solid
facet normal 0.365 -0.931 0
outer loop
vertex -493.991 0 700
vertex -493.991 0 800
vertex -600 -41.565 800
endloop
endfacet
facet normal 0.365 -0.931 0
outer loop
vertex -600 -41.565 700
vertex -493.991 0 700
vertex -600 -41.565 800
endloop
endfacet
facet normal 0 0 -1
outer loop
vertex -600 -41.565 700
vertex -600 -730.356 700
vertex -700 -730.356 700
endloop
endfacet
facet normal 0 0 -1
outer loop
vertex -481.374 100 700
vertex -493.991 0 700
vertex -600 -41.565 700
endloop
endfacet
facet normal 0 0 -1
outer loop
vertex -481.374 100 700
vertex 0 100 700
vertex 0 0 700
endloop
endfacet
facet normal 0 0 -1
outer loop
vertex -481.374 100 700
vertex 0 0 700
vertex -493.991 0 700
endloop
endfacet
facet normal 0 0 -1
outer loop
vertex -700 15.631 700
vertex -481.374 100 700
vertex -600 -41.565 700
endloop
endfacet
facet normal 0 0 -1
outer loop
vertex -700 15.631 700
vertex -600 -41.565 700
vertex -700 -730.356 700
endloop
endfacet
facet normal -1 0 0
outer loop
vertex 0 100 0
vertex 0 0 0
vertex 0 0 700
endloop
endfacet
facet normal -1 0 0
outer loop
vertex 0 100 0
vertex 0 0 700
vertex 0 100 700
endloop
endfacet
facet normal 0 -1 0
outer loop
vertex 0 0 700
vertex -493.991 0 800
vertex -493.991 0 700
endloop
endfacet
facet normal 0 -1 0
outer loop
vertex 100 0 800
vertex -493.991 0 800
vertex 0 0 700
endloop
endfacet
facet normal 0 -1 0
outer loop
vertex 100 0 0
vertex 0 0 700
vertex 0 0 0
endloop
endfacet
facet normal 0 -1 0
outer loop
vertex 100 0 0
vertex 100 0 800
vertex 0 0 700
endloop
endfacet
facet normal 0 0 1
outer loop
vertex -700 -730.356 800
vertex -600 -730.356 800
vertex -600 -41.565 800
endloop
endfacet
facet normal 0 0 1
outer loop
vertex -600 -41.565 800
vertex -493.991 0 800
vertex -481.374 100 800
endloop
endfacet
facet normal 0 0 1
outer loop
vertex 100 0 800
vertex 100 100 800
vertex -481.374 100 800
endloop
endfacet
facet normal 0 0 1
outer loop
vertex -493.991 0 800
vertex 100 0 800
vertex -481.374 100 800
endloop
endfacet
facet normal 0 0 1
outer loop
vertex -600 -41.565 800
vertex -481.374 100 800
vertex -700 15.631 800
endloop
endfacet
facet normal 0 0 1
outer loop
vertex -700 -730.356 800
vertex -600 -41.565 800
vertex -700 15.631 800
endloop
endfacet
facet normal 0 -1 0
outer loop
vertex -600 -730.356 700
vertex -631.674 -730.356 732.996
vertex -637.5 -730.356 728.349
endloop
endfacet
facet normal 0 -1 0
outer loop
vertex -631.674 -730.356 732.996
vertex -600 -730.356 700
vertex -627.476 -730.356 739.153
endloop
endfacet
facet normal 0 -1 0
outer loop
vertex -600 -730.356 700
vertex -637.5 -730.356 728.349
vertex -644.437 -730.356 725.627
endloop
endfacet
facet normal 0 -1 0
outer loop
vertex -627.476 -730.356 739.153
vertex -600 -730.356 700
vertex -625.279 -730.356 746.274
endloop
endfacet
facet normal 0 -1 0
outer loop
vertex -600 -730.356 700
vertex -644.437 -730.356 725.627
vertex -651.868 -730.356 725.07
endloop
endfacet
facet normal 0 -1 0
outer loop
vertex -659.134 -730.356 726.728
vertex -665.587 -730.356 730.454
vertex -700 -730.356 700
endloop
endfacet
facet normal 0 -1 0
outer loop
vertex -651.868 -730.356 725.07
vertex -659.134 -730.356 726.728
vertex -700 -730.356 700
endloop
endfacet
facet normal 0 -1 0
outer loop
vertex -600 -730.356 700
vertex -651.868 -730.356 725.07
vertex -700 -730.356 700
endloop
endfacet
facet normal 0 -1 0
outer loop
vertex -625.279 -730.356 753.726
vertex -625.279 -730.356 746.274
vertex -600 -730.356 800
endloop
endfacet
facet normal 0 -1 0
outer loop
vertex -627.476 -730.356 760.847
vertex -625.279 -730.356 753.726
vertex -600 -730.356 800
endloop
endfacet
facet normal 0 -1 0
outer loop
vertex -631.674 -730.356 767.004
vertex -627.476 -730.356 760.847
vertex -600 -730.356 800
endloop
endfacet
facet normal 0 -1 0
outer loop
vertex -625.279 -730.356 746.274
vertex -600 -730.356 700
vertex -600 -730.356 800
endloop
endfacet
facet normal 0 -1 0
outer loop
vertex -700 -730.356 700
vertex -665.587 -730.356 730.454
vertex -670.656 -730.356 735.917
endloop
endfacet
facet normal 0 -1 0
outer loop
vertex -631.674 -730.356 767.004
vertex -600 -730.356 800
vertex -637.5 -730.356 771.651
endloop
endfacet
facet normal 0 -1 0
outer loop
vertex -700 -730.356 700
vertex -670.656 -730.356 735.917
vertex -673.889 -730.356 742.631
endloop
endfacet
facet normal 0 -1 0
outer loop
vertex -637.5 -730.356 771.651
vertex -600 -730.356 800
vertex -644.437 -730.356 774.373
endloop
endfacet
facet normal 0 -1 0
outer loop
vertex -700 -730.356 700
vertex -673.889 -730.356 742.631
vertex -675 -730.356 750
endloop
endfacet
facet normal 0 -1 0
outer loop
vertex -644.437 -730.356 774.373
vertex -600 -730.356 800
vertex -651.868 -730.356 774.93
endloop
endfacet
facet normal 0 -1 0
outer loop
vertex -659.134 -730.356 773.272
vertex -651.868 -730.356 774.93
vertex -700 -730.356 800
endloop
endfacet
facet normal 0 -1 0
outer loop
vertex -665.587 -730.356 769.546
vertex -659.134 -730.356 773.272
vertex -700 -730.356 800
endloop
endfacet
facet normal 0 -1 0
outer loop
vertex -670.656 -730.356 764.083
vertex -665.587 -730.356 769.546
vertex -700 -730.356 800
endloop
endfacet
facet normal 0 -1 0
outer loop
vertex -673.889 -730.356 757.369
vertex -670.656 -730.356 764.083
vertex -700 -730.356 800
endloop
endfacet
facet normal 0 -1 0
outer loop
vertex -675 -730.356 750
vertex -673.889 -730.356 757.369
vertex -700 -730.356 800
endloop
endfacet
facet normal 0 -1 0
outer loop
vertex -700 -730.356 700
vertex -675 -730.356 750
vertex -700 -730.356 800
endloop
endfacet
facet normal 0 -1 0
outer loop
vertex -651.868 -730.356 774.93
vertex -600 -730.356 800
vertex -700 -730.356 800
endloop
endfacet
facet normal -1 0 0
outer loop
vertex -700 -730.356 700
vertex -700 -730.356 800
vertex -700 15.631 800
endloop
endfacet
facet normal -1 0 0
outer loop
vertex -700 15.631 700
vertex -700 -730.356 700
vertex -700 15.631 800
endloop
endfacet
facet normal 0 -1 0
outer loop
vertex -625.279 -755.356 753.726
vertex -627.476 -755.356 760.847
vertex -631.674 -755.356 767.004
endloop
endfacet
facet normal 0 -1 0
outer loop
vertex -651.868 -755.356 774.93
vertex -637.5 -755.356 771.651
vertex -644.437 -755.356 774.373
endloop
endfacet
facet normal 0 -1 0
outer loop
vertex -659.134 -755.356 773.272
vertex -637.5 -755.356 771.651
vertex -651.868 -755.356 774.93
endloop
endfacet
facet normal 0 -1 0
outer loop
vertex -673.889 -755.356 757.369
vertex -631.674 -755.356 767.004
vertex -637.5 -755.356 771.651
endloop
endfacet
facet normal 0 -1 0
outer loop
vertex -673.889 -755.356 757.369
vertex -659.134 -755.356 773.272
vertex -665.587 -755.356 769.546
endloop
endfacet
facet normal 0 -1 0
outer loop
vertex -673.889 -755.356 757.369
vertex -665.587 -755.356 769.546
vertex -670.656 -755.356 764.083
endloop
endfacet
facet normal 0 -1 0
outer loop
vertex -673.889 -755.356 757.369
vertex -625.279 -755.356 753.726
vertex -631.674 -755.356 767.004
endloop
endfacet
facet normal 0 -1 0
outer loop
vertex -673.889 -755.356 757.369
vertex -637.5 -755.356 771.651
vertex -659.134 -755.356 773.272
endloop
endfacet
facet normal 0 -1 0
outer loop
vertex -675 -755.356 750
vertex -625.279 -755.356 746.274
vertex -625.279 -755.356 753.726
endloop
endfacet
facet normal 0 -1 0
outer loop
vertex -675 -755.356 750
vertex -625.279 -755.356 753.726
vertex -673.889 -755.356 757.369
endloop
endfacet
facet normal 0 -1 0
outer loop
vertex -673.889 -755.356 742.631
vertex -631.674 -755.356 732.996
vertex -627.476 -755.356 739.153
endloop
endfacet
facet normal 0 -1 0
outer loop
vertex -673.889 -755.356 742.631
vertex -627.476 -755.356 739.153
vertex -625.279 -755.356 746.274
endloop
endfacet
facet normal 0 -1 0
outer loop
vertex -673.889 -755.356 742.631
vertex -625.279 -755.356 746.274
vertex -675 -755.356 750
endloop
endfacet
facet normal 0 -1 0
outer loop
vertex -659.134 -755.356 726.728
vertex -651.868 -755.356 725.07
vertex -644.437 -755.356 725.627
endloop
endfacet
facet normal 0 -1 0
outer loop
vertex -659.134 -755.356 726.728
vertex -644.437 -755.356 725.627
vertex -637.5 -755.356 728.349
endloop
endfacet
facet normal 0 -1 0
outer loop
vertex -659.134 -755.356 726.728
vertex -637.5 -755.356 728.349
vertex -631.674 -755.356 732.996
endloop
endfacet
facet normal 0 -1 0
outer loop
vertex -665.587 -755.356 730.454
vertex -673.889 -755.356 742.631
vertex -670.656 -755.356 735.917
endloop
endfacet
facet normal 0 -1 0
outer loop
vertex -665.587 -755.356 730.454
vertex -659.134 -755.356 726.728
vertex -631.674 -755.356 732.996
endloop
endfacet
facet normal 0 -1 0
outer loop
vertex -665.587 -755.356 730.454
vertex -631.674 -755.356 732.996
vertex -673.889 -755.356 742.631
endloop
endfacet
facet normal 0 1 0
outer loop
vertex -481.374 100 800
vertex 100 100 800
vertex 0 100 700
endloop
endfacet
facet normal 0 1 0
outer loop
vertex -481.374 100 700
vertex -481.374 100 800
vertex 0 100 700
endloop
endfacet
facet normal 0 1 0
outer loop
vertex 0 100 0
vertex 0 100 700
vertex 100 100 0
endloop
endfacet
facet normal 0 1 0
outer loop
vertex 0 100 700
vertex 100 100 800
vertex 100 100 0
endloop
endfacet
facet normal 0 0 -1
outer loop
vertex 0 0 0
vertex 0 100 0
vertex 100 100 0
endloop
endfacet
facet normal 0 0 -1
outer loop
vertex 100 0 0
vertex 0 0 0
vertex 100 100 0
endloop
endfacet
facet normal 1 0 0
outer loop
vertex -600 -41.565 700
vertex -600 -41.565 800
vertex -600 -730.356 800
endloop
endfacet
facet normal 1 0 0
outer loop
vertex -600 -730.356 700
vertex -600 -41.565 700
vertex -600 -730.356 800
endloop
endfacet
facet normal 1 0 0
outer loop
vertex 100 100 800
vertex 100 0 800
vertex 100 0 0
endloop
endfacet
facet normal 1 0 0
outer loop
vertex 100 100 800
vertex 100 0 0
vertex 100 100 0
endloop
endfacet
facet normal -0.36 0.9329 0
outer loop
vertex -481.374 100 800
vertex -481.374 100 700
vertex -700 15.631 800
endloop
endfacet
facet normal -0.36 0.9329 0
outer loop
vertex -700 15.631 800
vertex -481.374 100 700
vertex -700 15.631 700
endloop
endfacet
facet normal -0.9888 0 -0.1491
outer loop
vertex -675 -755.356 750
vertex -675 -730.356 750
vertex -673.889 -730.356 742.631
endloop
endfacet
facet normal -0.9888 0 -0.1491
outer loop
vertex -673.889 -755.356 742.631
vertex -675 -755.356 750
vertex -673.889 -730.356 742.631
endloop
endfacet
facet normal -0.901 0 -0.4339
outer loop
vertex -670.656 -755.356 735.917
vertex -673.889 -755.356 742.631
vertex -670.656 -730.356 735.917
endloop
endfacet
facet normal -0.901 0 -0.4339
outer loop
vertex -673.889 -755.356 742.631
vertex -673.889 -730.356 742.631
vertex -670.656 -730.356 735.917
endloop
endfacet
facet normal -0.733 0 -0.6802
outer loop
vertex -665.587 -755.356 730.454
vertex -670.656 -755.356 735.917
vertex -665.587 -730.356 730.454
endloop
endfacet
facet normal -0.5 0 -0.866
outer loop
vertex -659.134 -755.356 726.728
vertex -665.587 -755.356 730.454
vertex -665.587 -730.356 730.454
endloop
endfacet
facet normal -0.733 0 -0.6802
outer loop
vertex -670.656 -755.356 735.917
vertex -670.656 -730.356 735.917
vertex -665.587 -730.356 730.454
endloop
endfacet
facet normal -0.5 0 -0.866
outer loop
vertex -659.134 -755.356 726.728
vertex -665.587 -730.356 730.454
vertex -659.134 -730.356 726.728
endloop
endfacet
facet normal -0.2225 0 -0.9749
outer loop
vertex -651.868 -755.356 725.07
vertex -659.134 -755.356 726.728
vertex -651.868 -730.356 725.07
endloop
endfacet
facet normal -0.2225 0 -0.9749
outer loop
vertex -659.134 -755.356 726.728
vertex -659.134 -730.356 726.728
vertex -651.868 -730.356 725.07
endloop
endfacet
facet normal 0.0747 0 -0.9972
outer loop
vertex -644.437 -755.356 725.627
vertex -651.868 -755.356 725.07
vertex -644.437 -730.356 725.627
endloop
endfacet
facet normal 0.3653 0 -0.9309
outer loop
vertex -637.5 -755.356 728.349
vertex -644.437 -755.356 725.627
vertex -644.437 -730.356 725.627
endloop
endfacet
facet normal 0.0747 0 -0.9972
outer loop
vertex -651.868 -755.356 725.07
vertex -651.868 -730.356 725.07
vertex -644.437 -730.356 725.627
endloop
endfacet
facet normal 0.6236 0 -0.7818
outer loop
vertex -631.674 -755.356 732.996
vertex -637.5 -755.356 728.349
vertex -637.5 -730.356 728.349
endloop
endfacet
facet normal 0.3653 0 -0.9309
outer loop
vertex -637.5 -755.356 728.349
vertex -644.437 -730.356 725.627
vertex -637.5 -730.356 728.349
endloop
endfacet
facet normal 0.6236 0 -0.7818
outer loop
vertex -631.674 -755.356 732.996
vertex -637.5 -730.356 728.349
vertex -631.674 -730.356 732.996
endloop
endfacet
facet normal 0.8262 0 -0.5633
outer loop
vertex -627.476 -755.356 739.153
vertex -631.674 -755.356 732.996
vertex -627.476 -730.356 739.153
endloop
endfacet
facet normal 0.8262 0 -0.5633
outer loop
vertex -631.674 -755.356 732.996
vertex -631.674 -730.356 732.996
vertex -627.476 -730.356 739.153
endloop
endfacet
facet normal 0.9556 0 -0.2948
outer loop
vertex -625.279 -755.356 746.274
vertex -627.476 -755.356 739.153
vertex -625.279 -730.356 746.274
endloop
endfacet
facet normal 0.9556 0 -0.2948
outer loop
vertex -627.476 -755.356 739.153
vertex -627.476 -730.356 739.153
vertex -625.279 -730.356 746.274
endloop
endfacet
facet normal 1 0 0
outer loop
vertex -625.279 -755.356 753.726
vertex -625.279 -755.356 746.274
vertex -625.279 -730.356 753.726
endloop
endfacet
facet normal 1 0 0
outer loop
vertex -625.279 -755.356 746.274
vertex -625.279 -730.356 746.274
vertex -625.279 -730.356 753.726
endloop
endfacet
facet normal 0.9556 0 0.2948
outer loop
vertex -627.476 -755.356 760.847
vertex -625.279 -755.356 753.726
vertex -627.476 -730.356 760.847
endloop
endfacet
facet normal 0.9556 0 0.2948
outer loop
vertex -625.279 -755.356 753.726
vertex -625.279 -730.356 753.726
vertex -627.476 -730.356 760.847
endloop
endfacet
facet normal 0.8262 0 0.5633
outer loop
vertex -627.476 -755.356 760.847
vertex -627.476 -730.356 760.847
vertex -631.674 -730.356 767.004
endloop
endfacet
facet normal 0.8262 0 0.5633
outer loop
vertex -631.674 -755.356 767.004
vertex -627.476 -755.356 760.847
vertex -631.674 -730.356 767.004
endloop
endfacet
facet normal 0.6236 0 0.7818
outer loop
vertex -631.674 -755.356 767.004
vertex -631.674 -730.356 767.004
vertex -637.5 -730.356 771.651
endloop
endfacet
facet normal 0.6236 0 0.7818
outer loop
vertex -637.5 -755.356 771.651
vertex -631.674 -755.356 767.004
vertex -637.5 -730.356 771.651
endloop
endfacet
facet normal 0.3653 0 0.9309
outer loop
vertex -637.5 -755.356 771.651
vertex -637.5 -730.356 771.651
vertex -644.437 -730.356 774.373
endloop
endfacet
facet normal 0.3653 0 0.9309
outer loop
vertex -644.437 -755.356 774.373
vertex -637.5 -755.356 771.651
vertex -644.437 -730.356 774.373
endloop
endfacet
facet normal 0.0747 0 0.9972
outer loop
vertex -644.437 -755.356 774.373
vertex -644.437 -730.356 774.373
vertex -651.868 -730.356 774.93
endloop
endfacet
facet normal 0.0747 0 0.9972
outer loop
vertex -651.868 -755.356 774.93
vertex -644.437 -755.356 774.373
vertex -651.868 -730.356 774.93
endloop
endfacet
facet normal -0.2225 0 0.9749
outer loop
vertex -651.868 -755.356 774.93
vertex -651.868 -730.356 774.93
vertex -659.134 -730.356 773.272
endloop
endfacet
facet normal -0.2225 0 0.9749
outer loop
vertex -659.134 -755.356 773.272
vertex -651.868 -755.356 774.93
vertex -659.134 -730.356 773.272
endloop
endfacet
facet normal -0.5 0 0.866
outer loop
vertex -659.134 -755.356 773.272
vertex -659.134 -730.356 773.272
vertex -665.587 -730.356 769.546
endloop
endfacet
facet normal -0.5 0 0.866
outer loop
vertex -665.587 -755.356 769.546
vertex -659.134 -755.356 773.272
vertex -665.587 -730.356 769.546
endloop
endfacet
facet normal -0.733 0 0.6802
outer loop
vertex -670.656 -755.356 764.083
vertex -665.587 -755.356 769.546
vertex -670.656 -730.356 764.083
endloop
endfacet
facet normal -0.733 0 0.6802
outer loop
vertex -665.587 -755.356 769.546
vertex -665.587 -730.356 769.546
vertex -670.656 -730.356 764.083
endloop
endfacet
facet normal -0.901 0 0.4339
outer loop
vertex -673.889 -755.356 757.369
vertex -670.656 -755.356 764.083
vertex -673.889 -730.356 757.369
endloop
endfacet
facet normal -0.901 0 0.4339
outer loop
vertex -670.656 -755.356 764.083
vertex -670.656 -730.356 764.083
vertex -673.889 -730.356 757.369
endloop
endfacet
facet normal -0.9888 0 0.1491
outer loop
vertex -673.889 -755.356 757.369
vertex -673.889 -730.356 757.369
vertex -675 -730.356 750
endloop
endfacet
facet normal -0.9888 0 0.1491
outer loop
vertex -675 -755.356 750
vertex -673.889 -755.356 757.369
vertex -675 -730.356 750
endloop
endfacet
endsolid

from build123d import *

# Parameters (mm, degrees)
SKETCH1_W           = 100
SKETCH1_H           = 100
BOSS_EXTRUDE1_DEPTH = 800
SKETCH2_W           = 100
SKETCH2_H           = 100
BOSS_EXTRUDE2_DEPTH = 700
CUT_EXTRUDE1_DEPTH  = 801
BOSS_EXTRUDE3_DEPTH = 100
SKETCH5_R           = 25
BOSS_EXTRUDE4_DEPTH = 25


with BuildPart() as part:
    # Sketch1 → Boss-Extrude1 (new body)
    with BuildSketch(Plane.XY):
        with Locations((50, 50)):
            Rectangle(SKETCH1_W, SKETCH1_H)
    extrude(amount=BOSS_EXTRUDE1_DEPTH)

    # Sketch2 → Boss-Extrude2 (add)
    with BuildSketch(Plane(origin=(0, 0, 0), x_dir=(0, 0, -1), z_dir=(1, 0, 0))):
        with Locations((-750, 50)):
            Rectangle(SKETCH2_W, SKETCH2_H)
    extrude(amount=-BOSS_EXTRUDE2_DEPTH)

    # Sketch3 → Cut-Extrude1 (cut, through all)
    with BuildSketch(Plane.XY):
        Polygon((-481.374152596, 100), (-700, 15.631226575), (-700, 100), align=None)
    extrude(amount=CUT_EXTRUDE1_DEPTH, mode=Mode.SUBTRACT)

    # Sketch4 → Boss-Extrude3 (add)
    with BuildSketch(Plane.XY.offset(800)):
        Polygon((-493.990986432, 0), (-600, -41.564522078), (-600, -730.356100977), (-700, -730.356100977), (-700, 0), align=None)
    extrude(amount=-BOSS_EXTRUDE3_DEPTH)

    # Sketch5 → Boss-Extrude4 (add)
    with BuildSketch(Plane(origin=(0, -730.356100977, 0), x_dir=(-1, 0, 0), z_dir=(0, -1, 0))):
        with Locations((650, -750)):
            Circle(SKETCH5_R)
    extrude(amount=BOSS_EXTRUDE4_DEPTH)


solid = part.part
